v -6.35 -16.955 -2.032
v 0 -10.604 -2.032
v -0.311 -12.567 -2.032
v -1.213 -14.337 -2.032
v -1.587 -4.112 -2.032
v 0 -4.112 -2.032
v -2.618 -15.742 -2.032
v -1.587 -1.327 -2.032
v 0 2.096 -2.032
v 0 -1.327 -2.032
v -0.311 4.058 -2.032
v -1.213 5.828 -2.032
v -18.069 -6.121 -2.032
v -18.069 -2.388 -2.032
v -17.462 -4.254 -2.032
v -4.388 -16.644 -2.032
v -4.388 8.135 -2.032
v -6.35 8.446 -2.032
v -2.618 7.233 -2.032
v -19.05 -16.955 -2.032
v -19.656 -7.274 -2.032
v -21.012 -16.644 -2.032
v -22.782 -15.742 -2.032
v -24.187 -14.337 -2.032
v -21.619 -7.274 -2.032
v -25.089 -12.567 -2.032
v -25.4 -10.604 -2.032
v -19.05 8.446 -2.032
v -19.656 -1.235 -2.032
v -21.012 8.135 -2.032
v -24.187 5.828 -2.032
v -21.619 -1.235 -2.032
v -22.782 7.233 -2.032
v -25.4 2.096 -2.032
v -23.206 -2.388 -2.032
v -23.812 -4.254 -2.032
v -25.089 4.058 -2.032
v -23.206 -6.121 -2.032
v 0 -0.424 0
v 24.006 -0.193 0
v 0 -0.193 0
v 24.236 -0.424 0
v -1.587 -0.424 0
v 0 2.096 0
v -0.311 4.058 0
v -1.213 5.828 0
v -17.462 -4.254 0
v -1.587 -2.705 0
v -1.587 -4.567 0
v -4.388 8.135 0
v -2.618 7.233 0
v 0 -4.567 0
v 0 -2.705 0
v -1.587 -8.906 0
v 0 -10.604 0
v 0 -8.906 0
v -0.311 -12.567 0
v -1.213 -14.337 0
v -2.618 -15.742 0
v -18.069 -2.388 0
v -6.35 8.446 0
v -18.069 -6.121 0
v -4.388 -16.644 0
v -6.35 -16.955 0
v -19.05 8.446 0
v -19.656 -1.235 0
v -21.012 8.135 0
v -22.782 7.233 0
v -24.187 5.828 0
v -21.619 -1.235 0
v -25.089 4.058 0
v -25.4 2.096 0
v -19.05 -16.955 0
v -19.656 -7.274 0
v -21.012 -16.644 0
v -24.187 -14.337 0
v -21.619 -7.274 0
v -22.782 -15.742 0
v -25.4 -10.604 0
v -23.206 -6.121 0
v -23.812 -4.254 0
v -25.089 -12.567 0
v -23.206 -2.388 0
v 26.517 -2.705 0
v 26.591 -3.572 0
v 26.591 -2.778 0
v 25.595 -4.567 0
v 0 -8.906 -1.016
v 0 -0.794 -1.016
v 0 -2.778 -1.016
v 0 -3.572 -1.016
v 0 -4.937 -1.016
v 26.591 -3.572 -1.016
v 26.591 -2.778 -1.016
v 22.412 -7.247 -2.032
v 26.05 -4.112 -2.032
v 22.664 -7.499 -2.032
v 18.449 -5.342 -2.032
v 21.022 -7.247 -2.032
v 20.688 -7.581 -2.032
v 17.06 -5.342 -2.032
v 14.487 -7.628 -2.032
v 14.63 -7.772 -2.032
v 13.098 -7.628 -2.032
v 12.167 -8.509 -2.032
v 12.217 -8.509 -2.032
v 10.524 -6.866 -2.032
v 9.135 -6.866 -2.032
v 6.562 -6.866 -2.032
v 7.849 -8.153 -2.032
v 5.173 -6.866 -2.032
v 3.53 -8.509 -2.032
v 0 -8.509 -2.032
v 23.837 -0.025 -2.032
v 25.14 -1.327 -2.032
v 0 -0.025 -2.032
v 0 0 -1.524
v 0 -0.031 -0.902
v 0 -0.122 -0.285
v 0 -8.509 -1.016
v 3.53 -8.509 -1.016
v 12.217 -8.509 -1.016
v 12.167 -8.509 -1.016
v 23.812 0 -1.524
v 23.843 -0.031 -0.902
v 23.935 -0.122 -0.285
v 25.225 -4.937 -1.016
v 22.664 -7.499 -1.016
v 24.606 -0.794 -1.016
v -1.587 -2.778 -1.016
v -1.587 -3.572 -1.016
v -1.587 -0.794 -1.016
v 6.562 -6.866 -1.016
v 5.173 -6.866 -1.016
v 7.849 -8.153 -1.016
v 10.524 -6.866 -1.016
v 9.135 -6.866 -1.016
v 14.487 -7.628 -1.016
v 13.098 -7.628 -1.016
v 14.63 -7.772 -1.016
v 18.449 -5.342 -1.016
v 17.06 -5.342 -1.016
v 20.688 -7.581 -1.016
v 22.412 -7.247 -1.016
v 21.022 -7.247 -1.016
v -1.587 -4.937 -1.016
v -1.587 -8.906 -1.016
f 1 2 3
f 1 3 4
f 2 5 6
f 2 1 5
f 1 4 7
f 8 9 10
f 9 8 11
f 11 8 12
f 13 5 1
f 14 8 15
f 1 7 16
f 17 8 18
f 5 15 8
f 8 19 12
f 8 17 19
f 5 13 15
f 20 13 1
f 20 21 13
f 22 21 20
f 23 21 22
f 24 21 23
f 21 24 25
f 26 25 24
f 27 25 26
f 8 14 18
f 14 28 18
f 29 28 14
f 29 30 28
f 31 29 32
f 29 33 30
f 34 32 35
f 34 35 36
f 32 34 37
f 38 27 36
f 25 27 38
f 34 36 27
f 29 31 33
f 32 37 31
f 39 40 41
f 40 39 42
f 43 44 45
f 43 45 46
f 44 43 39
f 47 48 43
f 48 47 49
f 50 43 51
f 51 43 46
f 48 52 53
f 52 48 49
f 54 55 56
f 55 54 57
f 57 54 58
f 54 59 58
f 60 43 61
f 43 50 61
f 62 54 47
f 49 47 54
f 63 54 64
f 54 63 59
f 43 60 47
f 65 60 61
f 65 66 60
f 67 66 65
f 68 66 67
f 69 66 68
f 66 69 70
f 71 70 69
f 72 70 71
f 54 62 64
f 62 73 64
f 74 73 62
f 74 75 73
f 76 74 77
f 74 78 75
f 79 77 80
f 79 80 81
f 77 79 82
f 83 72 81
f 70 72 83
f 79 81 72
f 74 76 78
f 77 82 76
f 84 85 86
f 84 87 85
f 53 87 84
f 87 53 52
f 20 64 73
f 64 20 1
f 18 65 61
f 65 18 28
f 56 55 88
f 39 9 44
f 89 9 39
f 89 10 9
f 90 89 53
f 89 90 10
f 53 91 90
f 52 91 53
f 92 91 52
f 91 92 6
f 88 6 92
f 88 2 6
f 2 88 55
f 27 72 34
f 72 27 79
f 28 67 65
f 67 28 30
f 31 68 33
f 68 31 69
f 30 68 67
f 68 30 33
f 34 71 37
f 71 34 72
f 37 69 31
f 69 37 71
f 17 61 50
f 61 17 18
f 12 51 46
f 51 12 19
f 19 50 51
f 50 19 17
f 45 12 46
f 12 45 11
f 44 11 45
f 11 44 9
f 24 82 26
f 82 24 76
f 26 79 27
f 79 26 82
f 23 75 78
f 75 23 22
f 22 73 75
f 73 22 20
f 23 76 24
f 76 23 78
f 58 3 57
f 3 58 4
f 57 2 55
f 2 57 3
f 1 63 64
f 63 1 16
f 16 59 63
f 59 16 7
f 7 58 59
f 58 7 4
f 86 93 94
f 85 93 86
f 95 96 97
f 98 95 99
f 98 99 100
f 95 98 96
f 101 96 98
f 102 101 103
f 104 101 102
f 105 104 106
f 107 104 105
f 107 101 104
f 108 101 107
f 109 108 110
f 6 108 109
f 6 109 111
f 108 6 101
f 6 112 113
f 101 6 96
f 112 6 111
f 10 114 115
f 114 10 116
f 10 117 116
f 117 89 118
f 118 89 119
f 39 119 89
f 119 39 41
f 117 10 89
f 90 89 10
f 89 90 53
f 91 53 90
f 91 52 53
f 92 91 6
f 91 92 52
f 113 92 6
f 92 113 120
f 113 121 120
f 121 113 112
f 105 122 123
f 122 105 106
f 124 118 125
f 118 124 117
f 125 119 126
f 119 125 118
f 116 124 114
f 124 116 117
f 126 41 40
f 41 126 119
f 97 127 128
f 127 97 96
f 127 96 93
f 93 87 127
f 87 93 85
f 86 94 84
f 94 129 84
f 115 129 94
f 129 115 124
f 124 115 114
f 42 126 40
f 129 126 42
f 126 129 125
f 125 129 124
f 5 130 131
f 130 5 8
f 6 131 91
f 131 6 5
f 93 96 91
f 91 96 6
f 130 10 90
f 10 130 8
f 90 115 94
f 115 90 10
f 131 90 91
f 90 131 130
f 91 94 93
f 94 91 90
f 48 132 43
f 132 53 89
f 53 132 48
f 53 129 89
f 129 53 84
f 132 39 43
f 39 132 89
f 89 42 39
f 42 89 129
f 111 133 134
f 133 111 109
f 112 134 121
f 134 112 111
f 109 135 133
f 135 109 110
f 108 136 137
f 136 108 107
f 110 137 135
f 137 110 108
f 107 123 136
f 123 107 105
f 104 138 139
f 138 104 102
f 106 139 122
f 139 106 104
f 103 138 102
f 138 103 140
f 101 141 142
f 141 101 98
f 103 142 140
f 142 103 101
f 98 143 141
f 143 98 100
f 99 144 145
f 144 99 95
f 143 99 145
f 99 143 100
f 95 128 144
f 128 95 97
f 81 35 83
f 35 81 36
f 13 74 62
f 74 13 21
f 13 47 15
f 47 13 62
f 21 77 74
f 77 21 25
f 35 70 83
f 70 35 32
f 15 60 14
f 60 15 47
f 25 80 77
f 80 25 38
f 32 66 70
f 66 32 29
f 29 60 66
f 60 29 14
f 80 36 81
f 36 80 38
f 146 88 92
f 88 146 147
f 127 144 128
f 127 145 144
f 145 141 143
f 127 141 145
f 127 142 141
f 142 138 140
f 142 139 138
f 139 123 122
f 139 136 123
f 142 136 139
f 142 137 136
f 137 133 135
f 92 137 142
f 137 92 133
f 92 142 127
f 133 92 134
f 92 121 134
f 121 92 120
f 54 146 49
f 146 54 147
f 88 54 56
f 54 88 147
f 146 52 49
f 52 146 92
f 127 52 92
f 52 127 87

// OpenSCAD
// Physical Keygen - by Nirav Patel <http://eclecti.cc>
//
// Generate a duplicate of a Schlage SC1 key by editing the last line of the file
// and entering in the key code of the lock.  If you don't know the key code,
// you can measure the key and compare the numbers at:
// http://web.archive.org/web/20050217020917fw_/http://dlaco.com/spacing/tips.htm
//
// This work is licensed under a Creative Commons Attribution 3.0 Unported License.

// Since the keys and locks I have were all designed in imperial units, the
// constants in this file will be defined in inches.  The mm function
// allows us to retain the proper size for exporting a metric STL.
function mm(i) = i*25.4;

module rounded(size, r) {
    union() {
        translate([r, 0, 0]) cube([size[0]-2*r, size[1], size[2]]);
        translate([0, r, 0]) cube([size[0], size[1]-2*r, size[2]]);
        translate([r, r, 0]) cylinder(h=size[2], r=r);
        translate([size[0]-r, r, 0]) cylinder(h=size[2], r=r);
        translate([r, size[1]-r, 0]) cylinder(h=size[2], r=r);
        translate([size[0]-r, size[1]-r, 0]) cylinder(h=size[2], r=r);
    }
}

module bit() {
    w = mm(1/4);
    difference() {
        translate([-w/2, 0, 0]) cube([w, mm(1), w]);
        translate([-mm(7/256), 0, 0]) rotate([0, 0, 135]) cube([w, w, w]);
         translate([mm(7/256), 0, 0]) rotate([0, 0, -45]) cube([w, w, w]);
    }
}

// Schlage SC1 5 pin key.  The measurements are mostly guesses based on reverse
// engineering some keys I have and some publicly available information.
module sc1(bits) {
    // You may need to adjust these to fit your specific printer settings
    thickness = mm(0.080);
    length = mm(17/16);
    width = mm(.335);
    
    shoulder = mm(.231);
    pin_spacing = mm(.156);
    depth_inc = mm(.015);
    
    // A fudge factor.  Printing with your average RepRap, the bottom layer is
    // going to be squeezed larger than you want. You can make the pins
    // go slighly deeper by a fudge amount to make up for it if you aren't
    // adjusting for it elsewhere like Skeinforge or in your firmware.
    // 0.5mm works well for me.
    fudge = 0.5;
    
    // Handle size
    h_l = mm(1);
    h_w = mm(1);
    h_d = mm(1/16);
    difference() {
        // blade and key handle
        union() {
            translate([-h_l, -h_w/2 + width/2, 0]) rounded([h_l, h_w, thickness], mm(1/4));
            intersection() {
                // cut a little off the tip to avoid going too long
                cube([length - mm(1/64), width, thickness]);
                translate([0, mm(1/4), thickness*3/4]) rotate([0, 90, 0]) cylinder(h=length, r=mm(1/4), $fn=64);
            }
        }
        
        // chamfer the tip
        translate([length, mm(1/8), 0]) {
            rotate([0, 0, 45]) cube([10, 10, thickness]);
            rotate([0, 0, 225]) cube([10, 10, thickness]);
        }
        
        // put in a hole for keychain use
        translate([-h_l + mm(3/16), width/2, 0]) cylinder(h=thickness, r=mm(1/8));
        
        // cut the channels in the key.  designed more for printability than accuracy
        union() {
            translate([-h_d, mm(9/64), thickness/2]) rotate([62, 0, 0]) cube([length + h_d, width, width]);
            translate([-h_d, mm(7/64), thickness/2]) rotate([55, 0, 0]) cube([length + h_d, width, width]);
            translate([-h_d, mm(7/64), thickness/2]) cube([length + h_d, mm(1/32), width]);
        }
        
        translate([-h_d, width - mm(9/64), 0]) cube([length + h_d, width - (width - mm(10/64)), thickness/2]);
        translate([-h_d, width - mm(9/64), thickness/2]) rotate([-110, 0, 0]) cube([length + h_d, width, thickness/2]);
        
        intersection() {
            translate([-h_d, mm(1/32), thickness/2]) rotate([-118, 0, 0]) cube([length + h_d, width, width]);
            translate([-h_d, mm(1/32), thickness/2]) rotate([-110, 0, 0]) cube([length + h_d, width, width]);
        }
        
        // Do the actual bitting
        for (b = [0:4]) {
            translate([shoulder + b*pin_spacing, width - bits[b]*depth_inc - fudge, 0]) bit();
        }
    }
}

// This sample key goes to a lock that is sitting disassembled on my desk
// Flip the key over for easy printing
rotate([180, 0, 0]) sc1([3,3,1,7,2]);
